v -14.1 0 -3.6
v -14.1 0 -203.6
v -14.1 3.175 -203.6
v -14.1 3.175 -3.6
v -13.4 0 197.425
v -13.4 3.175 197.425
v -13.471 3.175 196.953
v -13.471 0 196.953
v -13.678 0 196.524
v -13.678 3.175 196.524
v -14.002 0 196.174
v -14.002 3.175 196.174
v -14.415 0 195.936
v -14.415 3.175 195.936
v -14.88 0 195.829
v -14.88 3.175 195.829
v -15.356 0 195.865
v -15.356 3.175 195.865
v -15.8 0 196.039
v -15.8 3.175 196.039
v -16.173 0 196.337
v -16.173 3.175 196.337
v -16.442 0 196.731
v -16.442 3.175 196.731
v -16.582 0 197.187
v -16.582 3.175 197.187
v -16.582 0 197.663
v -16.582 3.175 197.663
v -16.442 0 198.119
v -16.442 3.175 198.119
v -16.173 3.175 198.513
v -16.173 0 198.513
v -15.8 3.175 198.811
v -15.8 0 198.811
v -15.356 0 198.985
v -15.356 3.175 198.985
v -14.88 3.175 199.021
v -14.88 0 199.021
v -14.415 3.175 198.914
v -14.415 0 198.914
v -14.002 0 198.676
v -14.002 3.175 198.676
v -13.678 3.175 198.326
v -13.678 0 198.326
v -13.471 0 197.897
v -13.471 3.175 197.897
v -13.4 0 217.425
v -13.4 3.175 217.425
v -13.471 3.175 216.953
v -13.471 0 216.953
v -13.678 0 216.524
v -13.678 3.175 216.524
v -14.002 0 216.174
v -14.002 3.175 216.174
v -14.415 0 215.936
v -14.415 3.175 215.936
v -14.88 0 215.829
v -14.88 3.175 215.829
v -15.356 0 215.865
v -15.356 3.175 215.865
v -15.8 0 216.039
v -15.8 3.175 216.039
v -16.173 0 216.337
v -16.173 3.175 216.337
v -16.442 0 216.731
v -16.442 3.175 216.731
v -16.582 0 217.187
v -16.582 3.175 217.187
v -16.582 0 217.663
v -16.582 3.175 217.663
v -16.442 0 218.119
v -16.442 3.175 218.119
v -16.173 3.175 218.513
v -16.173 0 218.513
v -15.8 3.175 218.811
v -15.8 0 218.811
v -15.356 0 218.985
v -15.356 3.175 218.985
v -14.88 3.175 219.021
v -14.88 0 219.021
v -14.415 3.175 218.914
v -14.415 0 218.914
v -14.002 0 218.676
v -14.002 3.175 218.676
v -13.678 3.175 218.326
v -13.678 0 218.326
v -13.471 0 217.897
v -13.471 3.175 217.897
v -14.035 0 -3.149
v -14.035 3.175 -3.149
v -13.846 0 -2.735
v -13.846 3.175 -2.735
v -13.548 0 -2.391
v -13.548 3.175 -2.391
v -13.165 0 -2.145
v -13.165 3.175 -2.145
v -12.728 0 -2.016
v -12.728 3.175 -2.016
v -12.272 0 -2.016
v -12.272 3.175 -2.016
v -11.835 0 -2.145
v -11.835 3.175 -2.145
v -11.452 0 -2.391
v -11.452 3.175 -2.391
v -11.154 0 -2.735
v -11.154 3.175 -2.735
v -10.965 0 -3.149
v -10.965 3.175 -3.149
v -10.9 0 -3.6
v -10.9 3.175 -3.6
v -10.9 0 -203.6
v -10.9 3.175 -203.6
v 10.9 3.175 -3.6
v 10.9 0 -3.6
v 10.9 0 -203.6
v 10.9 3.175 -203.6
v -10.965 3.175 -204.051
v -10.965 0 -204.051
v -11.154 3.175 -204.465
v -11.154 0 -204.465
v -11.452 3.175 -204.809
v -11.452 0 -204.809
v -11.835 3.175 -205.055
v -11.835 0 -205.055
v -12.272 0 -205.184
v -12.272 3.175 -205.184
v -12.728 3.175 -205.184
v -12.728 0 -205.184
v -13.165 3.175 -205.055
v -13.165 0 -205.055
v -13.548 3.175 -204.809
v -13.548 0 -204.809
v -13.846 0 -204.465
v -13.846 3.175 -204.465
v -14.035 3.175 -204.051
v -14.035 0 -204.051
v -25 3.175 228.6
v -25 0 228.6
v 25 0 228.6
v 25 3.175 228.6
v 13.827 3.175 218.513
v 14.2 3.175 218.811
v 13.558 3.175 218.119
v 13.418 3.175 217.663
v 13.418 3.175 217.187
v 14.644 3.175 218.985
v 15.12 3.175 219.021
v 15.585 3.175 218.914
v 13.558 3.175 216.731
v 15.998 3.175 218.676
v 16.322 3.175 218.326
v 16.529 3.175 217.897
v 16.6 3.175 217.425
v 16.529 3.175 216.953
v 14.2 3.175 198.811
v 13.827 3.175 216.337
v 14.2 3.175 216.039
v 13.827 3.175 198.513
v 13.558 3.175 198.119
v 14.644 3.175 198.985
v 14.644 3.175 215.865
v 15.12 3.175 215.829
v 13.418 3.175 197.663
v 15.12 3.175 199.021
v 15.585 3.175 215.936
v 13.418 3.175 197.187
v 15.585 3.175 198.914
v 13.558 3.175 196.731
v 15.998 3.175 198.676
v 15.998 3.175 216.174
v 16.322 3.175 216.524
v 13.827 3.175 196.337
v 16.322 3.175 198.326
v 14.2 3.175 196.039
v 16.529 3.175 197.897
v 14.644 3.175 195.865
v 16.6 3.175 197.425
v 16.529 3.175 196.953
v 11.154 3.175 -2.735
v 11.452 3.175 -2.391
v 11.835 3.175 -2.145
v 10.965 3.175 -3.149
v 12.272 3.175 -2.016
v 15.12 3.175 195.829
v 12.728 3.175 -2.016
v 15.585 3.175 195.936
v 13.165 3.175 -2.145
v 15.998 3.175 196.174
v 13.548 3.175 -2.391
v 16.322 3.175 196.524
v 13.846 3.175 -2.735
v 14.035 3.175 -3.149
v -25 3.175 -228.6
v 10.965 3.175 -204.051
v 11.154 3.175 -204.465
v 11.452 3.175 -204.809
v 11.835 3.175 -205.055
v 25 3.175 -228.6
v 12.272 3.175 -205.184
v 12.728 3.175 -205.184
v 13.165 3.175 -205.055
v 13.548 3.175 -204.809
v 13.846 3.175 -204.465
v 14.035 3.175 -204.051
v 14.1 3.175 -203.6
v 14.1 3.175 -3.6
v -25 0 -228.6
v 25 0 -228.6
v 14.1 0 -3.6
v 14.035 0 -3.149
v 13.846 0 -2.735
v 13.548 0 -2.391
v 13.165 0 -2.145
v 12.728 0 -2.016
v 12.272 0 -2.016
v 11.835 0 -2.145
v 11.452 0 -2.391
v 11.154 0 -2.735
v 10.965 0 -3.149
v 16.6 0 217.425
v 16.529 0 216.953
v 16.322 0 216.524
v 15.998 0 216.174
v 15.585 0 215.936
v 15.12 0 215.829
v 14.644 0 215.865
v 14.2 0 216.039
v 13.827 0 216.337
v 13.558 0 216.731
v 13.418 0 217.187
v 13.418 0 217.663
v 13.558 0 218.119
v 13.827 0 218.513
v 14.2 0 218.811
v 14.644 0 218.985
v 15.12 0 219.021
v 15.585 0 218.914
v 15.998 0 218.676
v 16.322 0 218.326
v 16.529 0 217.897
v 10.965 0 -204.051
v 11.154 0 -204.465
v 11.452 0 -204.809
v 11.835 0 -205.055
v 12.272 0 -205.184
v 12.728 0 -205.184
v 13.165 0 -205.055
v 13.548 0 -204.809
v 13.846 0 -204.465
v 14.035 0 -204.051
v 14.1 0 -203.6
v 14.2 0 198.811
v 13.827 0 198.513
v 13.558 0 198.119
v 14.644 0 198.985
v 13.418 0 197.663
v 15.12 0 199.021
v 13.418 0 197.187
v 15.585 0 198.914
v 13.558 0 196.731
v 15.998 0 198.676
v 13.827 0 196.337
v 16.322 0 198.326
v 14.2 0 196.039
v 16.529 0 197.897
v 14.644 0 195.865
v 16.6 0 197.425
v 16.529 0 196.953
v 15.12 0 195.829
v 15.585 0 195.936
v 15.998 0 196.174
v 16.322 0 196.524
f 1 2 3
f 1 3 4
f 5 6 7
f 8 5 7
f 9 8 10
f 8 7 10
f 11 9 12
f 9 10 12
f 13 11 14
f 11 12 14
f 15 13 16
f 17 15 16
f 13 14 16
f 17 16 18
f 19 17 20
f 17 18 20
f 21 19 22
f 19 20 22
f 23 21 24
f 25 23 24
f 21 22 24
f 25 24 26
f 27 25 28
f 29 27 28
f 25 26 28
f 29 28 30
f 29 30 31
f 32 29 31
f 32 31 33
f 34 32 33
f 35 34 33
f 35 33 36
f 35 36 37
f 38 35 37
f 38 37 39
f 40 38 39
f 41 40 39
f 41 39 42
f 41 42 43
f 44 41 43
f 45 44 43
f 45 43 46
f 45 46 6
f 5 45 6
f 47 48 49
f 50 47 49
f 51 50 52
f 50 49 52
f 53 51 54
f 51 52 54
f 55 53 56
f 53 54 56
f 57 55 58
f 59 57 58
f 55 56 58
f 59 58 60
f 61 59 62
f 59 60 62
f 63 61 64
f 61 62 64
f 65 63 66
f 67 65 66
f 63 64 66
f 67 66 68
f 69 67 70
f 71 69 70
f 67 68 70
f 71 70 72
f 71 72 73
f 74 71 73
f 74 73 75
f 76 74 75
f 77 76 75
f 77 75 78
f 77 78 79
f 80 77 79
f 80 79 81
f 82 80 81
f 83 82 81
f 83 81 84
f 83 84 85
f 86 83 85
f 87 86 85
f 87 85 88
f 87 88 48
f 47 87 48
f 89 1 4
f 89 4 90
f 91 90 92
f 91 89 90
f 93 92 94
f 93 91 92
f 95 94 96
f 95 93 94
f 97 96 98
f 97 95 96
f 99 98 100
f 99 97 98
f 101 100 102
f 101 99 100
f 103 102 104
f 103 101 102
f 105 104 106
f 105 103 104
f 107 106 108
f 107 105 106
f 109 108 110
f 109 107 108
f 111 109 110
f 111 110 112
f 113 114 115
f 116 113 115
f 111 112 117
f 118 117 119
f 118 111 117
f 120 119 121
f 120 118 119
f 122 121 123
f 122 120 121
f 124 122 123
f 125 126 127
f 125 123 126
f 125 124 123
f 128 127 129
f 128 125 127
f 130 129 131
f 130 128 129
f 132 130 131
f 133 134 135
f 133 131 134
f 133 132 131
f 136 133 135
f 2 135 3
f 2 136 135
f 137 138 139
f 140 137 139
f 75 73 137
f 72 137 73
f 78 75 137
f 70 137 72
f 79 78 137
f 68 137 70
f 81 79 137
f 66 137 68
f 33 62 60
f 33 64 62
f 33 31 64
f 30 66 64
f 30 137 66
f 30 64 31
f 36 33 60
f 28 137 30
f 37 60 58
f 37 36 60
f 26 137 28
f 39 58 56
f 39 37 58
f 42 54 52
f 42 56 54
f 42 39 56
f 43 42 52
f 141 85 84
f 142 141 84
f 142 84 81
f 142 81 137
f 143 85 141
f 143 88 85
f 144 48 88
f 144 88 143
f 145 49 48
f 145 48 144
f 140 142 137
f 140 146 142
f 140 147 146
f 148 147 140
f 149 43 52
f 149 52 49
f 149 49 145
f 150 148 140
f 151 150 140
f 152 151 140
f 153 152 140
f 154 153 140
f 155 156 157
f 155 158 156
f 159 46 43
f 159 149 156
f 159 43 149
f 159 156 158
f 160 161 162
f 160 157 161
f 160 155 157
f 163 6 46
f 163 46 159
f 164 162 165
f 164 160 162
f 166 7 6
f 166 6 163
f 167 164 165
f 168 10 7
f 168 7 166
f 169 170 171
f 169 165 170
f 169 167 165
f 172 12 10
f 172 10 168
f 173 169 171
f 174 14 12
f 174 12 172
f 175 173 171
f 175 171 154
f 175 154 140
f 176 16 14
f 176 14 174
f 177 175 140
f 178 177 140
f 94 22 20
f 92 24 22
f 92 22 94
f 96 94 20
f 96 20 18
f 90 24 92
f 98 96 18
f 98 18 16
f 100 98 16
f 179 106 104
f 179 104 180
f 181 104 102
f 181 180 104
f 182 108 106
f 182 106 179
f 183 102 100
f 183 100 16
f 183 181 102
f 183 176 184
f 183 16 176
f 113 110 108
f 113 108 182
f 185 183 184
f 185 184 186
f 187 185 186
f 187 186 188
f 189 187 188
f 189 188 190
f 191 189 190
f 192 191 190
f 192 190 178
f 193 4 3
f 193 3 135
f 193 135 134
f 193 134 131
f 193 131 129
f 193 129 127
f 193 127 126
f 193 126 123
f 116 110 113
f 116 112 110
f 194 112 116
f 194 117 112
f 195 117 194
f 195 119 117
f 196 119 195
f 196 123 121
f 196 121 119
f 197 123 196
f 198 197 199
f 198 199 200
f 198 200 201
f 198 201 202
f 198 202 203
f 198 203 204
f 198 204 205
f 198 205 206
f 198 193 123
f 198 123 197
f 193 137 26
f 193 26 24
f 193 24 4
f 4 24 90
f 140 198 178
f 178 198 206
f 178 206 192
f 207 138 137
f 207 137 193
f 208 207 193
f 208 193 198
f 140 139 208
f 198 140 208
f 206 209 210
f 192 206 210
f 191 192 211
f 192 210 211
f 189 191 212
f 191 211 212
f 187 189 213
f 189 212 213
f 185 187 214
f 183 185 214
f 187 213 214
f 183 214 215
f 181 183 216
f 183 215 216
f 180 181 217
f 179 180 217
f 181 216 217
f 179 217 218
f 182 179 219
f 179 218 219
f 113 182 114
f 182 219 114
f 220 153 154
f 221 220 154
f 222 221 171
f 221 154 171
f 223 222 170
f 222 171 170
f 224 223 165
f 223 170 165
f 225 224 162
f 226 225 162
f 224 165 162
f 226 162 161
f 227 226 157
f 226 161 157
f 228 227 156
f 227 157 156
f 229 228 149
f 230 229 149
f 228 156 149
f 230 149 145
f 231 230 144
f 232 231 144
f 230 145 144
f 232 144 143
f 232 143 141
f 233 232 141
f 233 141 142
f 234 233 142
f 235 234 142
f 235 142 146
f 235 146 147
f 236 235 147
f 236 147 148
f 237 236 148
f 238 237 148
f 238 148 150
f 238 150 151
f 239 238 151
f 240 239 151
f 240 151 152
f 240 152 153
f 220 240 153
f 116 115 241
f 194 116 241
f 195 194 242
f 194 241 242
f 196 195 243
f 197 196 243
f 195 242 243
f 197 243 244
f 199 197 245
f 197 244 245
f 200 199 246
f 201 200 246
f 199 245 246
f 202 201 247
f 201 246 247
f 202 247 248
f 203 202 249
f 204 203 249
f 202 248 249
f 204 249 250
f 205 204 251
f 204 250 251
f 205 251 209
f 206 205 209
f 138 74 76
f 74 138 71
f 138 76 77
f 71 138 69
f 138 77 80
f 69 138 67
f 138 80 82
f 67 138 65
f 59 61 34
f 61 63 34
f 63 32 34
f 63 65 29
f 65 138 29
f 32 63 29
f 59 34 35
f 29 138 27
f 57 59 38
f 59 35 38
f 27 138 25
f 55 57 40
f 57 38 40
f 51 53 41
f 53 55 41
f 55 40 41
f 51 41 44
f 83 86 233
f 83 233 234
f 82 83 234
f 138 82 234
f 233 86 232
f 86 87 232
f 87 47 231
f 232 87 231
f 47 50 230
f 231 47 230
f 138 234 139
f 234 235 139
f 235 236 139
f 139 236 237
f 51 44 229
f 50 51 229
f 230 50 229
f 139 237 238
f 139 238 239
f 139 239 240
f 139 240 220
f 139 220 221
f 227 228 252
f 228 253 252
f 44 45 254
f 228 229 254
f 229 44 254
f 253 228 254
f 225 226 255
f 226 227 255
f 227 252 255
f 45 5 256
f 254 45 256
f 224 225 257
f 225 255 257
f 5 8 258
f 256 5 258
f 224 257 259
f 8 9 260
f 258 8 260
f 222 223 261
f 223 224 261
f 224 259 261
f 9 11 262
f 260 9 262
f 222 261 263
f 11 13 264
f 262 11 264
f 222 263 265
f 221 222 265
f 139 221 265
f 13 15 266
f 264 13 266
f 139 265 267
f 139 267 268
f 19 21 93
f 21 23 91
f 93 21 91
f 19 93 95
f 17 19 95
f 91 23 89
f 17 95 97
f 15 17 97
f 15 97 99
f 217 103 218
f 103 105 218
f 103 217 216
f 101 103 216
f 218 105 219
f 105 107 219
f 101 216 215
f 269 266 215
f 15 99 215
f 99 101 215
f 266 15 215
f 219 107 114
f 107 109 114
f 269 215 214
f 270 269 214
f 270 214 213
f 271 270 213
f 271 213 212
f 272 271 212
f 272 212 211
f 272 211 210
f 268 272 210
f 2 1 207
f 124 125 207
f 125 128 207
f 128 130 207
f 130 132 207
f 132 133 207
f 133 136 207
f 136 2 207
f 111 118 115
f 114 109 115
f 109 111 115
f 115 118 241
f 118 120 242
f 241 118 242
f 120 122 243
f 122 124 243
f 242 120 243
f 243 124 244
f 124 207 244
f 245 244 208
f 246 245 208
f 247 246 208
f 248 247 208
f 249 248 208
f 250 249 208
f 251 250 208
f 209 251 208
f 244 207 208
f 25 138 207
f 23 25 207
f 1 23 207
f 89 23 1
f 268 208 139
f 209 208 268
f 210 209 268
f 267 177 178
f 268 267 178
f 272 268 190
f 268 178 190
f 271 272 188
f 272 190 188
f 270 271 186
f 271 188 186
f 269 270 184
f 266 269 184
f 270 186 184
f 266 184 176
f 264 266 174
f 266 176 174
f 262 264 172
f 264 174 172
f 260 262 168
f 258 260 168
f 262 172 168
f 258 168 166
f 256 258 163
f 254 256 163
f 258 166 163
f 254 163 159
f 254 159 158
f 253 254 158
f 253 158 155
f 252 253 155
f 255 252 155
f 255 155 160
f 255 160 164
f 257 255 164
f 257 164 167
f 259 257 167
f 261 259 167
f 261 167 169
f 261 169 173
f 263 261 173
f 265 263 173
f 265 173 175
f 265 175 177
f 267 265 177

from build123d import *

# Parameters (mm, degrees)
SKETCH1_W            = 50
SKETCH1_H            = 457.2
BOSS_EXTRUDE1_DEPTH  = 3.175
CUT_EXTRUDE1_DEPTH   = 230.984870426
M3_CLEARANCE_HOLE1_D = 3.2


with BuildPart() as part:
    # Sketch1 → Boss-Extrude1 (new body)
    with BuildSketch(Plane(origin=(0, 0, 0), x_dir=(1, 0, 0), z_dir=(0, 1, 0))):
        Rectangle(SKETCH1_W, SKETCH1_H)
    extrude(amount=BOSS_EXTRUDE1_DEPTH)

    # Sketch2 → Cut-Extrude1 (cut, through all)
    with BuildSketch(Plane.XZ):
        with BuildLine():
            Line((-10.9, -3.6), (-10.9, -203.6))
            ThreePointArc((-10.9, -203.6), (-12.5, -205.2), (-14.1, -203.6))
            Line((-14.1, -203.6), (-14.1, -3.6))
            ThreePointArc((-14.1, -3.6), (-12.5, -2), (-10.9, -3.6))
        make_face()
        with BuildLine():
            Line((10.9, -3.6), (10.9, -203.6))
            ThreePointArc((10.9, -203.6), (12.5, -205.2), (14.1, -203.6))
            Line((14.1, -203.6), (14.1, -3.6))
            ThreePointArc((14.1, -3.6), (12.5, -2), (10.9, -3.6))
        make_face()
    extrude(amount=-CUT_EXTRUDE1_DEPTH, mode=Mode.SUBTRACT)

    # M3 Clearance Hole1 (through all)
    with Locations(Plane(origin=(0, 0, 0), x_dir=(-1, 0, 0), z_dir=(0, -1, 0))):
        with Locations((15, -217.425), (-15, -197.425), (-15, -217.425), (15, -197.425)):
            Hole(M3_CLEARANCE_HOLE1_D / 2)


solid = part.part
